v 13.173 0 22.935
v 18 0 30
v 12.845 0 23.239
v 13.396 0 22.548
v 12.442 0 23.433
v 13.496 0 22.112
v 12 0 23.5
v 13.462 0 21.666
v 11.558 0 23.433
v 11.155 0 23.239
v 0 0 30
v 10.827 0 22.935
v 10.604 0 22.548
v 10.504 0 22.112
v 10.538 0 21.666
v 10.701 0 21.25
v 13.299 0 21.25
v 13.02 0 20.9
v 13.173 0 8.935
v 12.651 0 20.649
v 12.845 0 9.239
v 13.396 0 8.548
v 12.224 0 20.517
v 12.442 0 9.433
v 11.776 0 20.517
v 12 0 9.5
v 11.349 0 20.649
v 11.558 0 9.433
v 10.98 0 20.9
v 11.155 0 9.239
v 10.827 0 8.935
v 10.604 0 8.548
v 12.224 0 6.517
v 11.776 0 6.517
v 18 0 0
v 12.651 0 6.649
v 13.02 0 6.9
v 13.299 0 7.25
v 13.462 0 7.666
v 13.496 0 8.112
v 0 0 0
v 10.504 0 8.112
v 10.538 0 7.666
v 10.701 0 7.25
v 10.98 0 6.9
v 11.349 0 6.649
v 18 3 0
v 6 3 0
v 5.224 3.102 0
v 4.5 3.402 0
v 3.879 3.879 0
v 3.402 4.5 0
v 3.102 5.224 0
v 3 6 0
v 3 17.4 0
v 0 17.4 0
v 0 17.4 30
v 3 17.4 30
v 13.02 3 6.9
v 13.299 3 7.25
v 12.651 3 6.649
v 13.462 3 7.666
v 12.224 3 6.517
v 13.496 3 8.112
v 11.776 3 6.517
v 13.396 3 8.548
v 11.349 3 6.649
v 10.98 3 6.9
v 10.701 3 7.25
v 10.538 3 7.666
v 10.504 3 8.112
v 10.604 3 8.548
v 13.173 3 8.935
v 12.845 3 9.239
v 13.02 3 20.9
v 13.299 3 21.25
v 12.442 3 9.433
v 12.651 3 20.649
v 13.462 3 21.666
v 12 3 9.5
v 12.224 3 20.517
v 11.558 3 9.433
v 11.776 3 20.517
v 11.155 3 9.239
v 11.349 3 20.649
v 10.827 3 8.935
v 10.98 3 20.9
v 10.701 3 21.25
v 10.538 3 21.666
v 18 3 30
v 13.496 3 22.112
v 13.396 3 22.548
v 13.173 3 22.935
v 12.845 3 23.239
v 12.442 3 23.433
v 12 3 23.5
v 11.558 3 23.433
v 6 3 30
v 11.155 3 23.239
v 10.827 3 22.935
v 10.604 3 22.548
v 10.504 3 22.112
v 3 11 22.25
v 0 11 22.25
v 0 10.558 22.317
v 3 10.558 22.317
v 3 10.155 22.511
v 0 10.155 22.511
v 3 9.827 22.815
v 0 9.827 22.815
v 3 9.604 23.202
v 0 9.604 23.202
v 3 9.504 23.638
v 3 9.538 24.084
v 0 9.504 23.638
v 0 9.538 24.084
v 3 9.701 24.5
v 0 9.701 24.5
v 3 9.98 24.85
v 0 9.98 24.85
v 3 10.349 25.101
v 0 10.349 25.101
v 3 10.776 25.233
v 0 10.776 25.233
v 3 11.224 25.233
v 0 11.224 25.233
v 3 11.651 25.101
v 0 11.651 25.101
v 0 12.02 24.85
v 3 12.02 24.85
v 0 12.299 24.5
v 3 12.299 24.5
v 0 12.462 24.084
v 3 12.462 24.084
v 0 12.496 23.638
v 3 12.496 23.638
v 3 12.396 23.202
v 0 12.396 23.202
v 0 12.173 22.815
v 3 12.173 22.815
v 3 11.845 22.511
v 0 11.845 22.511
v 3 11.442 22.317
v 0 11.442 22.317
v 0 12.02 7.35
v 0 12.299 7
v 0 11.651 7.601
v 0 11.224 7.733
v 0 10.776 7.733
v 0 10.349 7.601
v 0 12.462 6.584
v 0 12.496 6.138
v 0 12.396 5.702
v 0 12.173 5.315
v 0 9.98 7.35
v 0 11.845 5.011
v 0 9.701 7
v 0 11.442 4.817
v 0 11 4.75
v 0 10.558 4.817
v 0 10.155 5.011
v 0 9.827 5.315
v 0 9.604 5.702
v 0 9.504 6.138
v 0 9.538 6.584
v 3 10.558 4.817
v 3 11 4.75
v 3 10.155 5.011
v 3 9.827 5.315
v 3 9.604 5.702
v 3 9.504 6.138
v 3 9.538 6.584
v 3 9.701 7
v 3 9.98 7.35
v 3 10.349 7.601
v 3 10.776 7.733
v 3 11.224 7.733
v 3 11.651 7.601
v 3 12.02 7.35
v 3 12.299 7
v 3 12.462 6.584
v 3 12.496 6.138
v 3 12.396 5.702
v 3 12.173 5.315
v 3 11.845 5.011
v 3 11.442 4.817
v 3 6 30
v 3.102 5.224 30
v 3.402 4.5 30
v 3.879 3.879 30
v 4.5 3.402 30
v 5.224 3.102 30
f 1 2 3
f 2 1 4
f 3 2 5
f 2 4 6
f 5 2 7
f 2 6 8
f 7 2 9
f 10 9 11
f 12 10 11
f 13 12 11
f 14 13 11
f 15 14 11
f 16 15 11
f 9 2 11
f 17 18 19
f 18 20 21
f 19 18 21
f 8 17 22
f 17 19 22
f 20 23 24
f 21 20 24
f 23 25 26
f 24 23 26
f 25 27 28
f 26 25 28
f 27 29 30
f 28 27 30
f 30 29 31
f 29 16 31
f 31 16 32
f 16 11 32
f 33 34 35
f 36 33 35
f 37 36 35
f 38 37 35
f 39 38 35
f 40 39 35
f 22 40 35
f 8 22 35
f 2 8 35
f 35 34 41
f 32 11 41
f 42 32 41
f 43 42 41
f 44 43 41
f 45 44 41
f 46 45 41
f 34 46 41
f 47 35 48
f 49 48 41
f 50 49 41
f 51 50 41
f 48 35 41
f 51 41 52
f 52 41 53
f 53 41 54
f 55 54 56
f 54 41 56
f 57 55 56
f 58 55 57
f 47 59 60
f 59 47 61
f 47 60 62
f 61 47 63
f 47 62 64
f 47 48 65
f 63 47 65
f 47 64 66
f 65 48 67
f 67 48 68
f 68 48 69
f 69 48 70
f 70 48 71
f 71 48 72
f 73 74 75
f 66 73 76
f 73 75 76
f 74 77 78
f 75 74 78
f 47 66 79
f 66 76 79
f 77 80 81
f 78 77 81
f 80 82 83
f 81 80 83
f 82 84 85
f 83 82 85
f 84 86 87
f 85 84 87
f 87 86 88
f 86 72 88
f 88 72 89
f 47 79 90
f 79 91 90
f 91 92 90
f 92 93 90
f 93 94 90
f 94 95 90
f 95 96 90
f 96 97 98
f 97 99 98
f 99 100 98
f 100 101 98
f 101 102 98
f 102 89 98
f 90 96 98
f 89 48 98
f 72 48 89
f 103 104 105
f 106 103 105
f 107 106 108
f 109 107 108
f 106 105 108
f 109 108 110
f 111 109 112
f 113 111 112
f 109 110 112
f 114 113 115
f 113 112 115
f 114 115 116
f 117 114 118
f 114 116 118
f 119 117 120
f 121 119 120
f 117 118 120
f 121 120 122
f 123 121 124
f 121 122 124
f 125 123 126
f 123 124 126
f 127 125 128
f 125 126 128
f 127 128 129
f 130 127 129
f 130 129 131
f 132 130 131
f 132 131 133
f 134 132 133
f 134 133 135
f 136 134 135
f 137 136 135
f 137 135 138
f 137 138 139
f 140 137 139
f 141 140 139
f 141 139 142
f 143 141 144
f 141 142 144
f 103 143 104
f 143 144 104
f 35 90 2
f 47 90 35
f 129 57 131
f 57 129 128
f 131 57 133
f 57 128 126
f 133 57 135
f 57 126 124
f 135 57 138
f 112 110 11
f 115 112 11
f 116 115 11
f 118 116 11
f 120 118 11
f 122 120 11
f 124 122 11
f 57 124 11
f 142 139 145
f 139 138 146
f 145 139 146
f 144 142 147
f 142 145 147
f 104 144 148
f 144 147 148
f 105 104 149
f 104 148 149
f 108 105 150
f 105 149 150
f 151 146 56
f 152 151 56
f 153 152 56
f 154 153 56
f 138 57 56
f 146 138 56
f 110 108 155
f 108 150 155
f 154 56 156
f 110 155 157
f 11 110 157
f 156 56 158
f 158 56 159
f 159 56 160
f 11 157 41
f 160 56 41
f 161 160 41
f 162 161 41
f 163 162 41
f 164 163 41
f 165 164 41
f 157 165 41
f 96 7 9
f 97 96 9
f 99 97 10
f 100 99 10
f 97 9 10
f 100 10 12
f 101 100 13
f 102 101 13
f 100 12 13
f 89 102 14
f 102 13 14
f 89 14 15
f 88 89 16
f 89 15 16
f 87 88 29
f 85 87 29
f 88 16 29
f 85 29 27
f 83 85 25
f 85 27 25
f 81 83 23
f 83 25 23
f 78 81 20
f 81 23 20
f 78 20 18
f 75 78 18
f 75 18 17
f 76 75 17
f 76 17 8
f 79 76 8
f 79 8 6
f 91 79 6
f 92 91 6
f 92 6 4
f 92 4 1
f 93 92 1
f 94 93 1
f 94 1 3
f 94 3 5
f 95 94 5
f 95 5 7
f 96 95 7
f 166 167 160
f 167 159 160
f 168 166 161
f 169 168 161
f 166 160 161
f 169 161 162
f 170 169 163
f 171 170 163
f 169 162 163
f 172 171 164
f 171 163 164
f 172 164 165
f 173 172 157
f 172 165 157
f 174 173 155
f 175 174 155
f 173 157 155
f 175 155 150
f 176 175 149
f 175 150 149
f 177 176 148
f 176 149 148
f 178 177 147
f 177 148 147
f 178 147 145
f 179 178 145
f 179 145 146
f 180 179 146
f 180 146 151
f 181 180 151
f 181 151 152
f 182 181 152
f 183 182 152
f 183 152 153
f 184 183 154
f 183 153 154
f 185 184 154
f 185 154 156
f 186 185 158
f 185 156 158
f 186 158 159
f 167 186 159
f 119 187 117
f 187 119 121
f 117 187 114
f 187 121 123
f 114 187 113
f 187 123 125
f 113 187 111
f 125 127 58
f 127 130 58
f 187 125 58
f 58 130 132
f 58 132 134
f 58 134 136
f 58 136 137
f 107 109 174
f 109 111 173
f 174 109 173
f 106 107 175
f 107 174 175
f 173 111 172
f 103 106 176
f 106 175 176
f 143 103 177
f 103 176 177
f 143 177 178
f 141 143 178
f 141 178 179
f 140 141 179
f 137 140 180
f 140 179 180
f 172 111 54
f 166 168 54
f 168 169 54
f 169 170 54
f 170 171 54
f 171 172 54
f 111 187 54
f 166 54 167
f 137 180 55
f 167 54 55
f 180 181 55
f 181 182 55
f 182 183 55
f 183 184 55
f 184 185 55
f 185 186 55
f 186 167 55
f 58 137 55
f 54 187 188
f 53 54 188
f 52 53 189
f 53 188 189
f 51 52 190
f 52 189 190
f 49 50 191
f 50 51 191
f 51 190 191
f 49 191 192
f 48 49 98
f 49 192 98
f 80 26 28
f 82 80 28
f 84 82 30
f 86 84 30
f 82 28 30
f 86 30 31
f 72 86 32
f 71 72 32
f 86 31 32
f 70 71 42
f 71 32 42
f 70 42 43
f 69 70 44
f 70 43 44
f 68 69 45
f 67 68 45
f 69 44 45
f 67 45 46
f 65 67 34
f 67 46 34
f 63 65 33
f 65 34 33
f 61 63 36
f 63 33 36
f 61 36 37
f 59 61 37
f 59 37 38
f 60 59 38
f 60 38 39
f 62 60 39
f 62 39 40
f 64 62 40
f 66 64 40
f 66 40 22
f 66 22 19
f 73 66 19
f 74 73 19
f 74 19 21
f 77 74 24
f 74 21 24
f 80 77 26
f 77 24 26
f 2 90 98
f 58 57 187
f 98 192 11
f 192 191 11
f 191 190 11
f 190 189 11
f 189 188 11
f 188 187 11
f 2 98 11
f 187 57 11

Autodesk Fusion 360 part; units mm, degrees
sketch "Boceto1" plane through (0, 0, 0) normal (0, 0, 1) x (1, 0, 0)
  line L0 (0, 0) -> (3, 0)
  line L1 (3, 0) -> (3, 22.4)
  line L2 (3, 22.4) -> (0, 22.4)
  line L3 (0, 22.4) -> (0, 0)
  dimension "d1" = 3
  dimension "d2" = 22.4
extrude "Extruir1" add sketch "Boceto1" along normal blind 30
sketch "Boceto2" plane through (3, 0, 0) normal (1, 0, 0) x (0, 0, -1)
  line L0 (0, 0) -> (0, 22.4)
  line L1 (0, 22.4) -> (-30, 22.4)
  line L2 (-30, 22.4) -> (-30, 0)
  line L3 (-30, 0) -> (0, 0)
  circle A0 centre (-23.75, 11) radius 1.65
  circle A1 centre (-6.25, 11) radius 1.65
  dimension "d7" = 3.3
  dimension "d8" = 3.3
hole "Agujero1" at (3, 11, 23.75) at (3, 11, 6.25) direction (-1, 0, 0) diameter 3 depth 10 tip angle 118
sketch "Boceto3" plane through (3, 0, 0) normal (1, 0, 0) x (0, 0, -1)
  circle A0 centre (-23.75, 11) radius 1.5
  circle A1 centre (-6.25, 11) radius 1.5
  line L0 (0, 0) -> (0, 22.4)
  line L1 (0, 22.4) -> (-30, 22.4)
  line L2 (-30, 22.4) -> (-30, 0)
  line L3 (-30, 0) -> (0, 0)
  line L4 (-30, 0) -> (0, 0)
  line L5 (0, 0) -> (0, 3)
  line L6 (0, 3) -> (-30, 3)
  line L7 (-30, 3) -> (-30, 0)
  dimension "d12" = 30
  dimension "d13" = 3
extrude "Extruir2" add sketch "Boceto3" along normal blind 15 contours L0 L2 L3 L4 L5 L6 L7
fillet "Empalme1" radius 3 1 edges at (3, 3, 15)
sketch "Boceto4" plane through (0, 3, 0) normal (0, 1, 0) x (-1, 0, 0)
  line L0 (-6, 0) -> (-6, 30)
  line L1 (-6, 30) -> (-18, 30)
  line L2 (-18, 30) -> (-18, 0)
  line L3 (-18, 0) -> (-6, 0)
  circle A0 centre (-12, 8) radius 1.5
  circle A1 centre (-12, 22) radius 1.5
  dimension "d18" = 3
  dimension "d19" = 3
hole "Agujero2" at (12, 3, 22) at (12, 3, 8) direction (0, -1, 0) diameter 3 depth 10 tip angle 118
sketch "Boceto5" plane through (3, 0, 0) normal (1, 0, 0) x (0, 0, -1)
  line L0 (-30, 6) -> (0, 6)
  line L1 (0, 6) -> (0, 22.4)
  line L2 (0, 22.4) -> (-30, 22.4)
  line L3 (-30, 22.4) -> (-30, 6)
  circle A0 centre (-23.75, 11) radius 1.5
  circle A1 centre (-6.25, 11) radius 1.5
  line L4 (-30, 22.4) -> (0, 22.4)
  line L5 (0, 22.4) -> (0, 17.4)
  line L6 (0, 17.4) -> (-30, 17.4)
  line L7 (-30, 17.4) -> (-30, 22.4)
  dimension "d23" = 5
extrude "Extruir3" cut sketch "Boceto5" against normal blind 9 contours L1 L2 L3 L4 L5 L6 L7
